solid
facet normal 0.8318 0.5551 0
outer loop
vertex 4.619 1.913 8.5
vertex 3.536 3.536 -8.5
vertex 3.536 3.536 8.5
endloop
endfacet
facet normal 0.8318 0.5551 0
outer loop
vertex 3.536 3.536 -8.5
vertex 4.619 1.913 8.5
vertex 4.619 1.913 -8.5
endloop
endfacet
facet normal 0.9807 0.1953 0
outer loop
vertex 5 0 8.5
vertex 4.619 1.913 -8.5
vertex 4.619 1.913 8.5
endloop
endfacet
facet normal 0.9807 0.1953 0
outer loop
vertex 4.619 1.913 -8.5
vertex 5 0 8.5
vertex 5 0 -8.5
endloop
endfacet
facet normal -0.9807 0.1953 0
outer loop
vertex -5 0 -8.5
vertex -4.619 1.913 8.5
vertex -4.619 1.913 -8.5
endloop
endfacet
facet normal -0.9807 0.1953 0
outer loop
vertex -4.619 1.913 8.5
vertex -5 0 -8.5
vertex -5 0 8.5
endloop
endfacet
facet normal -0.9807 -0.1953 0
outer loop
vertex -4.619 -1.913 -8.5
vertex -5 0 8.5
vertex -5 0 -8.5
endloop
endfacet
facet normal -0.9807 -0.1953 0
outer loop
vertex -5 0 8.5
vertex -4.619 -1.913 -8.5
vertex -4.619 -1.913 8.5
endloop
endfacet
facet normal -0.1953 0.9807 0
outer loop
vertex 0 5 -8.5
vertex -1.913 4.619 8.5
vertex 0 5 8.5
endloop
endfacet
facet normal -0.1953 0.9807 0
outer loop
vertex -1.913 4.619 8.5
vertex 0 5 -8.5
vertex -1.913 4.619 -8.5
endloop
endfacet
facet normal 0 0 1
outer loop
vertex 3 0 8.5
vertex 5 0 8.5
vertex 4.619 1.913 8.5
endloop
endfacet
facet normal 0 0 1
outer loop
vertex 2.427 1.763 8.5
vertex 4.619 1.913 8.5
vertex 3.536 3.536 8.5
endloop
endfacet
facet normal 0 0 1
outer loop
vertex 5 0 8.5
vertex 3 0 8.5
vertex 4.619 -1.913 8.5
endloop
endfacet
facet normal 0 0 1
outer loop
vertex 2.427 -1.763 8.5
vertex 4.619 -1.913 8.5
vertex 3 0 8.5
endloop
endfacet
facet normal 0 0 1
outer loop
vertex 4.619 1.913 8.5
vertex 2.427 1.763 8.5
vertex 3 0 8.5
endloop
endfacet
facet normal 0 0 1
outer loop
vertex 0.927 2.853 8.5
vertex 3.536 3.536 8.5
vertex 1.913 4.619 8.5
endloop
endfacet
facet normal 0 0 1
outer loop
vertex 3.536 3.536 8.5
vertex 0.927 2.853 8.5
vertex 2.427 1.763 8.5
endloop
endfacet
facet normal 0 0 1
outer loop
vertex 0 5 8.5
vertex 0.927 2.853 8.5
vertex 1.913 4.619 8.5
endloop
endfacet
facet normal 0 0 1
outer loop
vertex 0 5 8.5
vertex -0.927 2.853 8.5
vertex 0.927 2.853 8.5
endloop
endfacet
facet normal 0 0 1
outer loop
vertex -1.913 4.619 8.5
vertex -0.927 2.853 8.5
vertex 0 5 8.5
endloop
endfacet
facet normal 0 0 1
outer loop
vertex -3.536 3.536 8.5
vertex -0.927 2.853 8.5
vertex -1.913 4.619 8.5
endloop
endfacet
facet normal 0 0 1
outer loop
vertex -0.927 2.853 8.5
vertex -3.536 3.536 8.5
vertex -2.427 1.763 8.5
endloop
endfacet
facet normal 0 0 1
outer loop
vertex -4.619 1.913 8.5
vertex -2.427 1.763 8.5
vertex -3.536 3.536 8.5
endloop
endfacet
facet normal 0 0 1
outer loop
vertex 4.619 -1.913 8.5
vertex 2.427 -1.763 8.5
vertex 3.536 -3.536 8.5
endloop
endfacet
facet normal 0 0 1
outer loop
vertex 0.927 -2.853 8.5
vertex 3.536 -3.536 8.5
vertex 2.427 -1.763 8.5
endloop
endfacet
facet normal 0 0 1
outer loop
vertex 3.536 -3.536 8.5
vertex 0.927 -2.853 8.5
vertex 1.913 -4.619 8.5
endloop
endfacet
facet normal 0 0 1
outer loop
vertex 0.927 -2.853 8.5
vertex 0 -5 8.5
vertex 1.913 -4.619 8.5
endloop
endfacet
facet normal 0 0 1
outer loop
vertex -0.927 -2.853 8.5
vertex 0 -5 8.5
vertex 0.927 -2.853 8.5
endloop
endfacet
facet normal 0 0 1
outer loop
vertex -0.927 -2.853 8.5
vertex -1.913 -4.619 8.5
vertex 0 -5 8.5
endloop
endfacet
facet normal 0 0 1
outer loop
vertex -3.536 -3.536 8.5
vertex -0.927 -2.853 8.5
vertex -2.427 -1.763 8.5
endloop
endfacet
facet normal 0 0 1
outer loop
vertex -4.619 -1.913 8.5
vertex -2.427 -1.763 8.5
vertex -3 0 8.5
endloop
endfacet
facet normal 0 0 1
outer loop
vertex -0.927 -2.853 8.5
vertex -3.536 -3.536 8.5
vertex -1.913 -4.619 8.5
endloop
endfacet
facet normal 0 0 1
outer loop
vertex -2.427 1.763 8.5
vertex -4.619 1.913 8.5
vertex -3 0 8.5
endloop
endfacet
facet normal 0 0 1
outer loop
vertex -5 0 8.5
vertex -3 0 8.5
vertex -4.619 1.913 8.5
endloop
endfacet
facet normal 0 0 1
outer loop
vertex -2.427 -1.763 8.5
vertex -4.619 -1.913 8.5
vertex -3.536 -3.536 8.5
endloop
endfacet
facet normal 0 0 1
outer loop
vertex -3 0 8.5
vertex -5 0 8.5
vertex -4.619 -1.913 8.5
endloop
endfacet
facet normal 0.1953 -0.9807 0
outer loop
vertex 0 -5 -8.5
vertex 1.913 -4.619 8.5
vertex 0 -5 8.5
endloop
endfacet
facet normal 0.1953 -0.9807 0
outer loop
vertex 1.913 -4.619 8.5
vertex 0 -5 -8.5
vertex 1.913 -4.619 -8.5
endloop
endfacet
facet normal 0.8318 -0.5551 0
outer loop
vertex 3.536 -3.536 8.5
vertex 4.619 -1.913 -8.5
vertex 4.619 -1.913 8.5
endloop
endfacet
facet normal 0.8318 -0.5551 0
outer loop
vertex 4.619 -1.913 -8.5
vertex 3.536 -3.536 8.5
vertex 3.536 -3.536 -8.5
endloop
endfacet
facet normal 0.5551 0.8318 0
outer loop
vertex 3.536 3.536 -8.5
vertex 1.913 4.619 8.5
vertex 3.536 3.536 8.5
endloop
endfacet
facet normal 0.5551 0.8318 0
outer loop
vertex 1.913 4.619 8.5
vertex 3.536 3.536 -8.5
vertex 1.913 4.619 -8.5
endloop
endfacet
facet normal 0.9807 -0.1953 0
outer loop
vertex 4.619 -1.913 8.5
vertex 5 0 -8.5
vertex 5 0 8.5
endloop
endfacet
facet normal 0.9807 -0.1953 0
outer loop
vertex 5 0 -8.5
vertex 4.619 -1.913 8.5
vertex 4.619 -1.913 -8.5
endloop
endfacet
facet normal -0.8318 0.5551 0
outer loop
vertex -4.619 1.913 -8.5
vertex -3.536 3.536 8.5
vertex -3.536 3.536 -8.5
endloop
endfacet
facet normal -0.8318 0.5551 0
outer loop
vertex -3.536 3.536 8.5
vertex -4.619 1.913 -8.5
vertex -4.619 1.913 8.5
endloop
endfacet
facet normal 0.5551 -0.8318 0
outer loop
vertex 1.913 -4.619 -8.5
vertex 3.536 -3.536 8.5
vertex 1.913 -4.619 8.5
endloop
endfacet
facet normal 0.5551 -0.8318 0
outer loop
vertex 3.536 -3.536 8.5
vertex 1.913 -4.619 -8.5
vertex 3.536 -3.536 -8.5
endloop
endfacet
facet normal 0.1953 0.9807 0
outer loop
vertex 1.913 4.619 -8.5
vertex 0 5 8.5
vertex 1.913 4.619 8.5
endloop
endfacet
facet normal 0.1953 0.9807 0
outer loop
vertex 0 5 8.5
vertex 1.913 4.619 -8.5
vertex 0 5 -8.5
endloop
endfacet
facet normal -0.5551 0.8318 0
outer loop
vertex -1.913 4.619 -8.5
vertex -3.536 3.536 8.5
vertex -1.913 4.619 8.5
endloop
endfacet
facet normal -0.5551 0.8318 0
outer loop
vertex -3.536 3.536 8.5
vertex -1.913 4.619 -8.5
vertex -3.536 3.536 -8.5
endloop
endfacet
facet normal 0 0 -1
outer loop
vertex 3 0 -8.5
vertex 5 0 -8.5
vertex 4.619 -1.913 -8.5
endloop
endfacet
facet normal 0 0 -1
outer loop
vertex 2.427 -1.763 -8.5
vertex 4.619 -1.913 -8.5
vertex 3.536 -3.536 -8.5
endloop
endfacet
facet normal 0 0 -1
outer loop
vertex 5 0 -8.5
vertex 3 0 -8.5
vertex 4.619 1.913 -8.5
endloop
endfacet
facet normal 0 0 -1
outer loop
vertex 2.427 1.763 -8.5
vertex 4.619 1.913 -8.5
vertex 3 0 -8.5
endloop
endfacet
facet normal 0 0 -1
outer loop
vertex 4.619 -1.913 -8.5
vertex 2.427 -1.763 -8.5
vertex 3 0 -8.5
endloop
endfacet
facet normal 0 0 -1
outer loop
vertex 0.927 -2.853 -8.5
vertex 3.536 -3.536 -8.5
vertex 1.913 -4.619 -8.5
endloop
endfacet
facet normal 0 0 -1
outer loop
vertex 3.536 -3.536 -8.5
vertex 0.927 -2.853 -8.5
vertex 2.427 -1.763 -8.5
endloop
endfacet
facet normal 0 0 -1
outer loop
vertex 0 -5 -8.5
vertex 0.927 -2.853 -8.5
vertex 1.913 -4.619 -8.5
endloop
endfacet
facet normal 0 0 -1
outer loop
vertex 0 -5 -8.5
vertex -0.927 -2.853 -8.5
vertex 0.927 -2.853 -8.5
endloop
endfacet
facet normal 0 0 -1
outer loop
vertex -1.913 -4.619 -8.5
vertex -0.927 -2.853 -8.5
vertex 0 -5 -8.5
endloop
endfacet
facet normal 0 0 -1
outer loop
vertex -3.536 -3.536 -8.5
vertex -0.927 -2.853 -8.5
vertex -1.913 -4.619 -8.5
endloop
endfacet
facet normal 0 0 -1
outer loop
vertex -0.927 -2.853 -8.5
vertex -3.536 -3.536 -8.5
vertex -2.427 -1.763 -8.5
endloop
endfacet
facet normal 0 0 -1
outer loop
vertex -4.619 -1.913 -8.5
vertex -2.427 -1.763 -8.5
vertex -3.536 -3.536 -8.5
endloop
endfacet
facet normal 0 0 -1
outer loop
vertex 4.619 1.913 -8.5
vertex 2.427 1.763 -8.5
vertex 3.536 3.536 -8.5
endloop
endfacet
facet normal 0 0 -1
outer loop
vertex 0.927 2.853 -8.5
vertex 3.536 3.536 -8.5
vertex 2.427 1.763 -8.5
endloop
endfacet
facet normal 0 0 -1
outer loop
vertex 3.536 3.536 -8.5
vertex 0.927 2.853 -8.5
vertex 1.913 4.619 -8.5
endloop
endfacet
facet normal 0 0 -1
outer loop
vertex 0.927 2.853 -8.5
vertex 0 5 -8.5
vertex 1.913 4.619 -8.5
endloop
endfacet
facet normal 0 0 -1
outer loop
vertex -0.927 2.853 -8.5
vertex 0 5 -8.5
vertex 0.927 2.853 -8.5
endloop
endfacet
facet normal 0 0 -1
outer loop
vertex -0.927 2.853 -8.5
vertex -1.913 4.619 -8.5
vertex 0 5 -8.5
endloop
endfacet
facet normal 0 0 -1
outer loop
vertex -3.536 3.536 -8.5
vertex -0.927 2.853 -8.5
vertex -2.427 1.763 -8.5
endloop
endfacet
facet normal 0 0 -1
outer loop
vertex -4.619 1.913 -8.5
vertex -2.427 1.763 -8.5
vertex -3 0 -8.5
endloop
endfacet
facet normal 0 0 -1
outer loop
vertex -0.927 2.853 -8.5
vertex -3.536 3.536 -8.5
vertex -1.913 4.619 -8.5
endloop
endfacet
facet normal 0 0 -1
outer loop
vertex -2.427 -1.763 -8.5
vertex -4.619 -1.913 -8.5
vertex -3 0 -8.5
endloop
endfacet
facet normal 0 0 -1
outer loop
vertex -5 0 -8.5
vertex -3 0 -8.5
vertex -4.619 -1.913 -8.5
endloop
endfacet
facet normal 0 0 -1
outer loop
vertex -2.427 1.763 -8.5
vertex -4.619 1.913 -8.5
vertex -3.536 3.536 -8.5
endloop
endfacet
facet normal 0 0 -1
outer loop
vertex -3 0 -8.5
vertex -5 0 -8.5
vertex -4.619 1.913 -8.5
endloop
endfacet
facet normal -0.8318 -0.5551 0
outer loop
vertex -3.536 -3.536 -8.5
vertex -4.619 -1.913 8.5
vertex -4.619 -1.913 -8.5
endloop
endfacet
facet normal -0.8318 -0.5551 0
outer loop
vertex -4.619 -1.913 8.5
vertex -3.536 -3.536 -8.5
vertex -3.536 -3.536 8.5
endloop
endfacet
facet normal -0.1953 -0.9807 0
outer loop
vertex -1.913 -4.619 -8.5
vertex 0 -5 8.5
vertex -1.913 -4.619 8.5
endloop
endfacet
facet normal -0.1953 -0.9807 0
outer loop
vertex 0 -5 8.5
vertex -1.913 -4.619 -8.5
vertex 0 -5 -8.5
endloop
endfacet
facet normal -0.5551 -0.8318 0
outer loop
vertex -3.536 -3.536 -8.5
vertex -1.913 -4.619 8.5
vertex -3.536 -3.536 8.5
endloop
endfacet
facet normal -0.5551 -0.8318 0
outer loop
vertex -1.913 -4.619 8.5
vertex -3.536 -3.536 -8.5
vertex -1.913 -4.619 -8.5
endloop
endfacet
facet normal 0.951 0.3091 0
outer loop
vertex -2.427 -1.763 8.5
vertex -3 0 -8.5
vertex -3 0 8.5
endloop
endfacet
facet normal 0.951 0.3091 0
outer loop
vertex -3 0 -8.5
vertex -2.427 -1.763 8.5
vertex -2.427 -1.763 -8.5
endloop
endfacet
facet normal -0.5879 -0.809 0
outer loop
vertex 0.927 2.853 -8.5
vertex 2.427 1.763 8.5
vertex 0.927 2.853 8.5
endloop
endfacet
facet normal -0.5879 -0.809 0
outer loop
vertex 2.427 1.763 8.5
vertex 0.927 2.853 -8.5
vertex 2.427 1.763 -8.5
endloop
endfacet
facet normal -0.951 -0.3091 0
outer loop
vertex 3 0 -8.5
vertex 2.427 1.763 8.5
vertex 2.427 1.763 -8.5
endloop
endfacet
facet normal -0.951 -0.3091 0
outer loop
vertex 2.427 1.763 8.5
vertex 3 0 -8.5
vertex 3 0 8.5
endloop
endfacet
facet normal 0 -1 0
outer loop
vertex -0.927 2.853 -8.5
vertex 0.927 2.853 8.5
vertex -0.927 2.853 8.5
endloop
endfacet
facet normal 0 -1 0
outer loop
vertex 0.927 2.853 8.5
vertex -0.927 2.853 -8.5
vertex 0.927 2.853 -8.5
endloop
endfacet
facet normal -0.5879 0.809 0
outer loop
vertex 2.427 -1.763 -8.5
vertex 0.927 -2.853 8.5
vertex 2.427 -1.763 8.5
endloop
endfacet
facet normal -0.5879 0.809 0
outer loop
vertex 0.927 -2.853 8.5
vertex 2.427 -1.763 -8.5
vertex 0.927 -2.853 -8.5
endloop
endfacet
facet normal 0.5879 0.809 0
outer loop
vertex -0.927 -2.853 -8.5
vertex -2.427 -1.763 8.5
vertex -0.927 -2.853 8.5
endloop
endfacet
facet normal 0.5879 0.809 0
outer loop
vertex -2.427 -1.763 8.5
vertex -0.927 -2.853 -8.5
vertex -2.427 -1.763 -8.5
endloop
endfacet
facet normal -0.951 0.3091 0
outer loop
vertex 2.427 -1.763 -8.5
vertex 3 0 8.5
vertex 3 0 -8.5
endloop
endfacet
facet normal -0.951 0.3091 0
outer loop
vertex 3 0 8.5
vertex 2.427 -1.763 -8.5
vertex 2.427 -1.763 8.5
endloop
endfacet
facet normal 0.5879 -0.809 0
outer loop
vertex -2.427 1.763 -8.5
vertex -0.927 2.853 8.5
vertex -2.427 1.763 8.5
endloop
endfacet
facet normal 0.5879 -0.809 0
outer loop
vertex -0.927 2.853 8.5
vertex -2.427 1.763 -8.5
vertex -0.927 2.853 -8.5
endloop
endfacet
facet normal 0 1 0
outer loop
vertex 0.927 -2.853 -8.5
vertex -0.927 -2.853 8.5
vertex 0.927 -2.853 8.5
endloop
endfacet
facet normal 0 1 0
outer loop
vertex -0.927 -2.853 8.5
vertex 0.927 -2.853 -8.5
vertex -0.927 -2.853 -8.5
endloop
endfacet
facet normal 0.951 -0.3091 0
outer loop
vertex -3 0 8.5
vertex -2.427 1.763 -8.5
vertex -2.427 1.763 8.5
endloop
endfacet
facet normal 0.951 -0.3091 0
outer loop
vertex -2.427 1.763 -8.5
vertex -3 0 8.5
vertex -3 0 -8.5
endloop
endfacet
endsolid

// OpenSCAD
// Parameters
length = 15; //[8:30:1]
outer_diameter = 10; //[5:20:0.5]
inner_diameter = 6; //[3:18:0.5]
forced_id = 0; //[0:18:0.5]
center = 1; //[0:1:1]
eps = 1; //[0.5:2:0.1]

// Tubing - complete geometry
module tubing() {
  color([0.2, 0.2, 0.2]) { // Neoprene color
    difference() {
      // Outer tube
      cylinder(h=length + 2*eps, r=outer_diameter/2, center=true);
      // Inner bore
      cylinder(h=length + 4*eps, r=((forced_id>0)?forced_id:inner_diameter)/2, center=true);
    }
  }
}

// Assembly
module assembly() {
  translate([0, 0, ((center>0)?0:(length/2))]) tubing();
}

assembly();
